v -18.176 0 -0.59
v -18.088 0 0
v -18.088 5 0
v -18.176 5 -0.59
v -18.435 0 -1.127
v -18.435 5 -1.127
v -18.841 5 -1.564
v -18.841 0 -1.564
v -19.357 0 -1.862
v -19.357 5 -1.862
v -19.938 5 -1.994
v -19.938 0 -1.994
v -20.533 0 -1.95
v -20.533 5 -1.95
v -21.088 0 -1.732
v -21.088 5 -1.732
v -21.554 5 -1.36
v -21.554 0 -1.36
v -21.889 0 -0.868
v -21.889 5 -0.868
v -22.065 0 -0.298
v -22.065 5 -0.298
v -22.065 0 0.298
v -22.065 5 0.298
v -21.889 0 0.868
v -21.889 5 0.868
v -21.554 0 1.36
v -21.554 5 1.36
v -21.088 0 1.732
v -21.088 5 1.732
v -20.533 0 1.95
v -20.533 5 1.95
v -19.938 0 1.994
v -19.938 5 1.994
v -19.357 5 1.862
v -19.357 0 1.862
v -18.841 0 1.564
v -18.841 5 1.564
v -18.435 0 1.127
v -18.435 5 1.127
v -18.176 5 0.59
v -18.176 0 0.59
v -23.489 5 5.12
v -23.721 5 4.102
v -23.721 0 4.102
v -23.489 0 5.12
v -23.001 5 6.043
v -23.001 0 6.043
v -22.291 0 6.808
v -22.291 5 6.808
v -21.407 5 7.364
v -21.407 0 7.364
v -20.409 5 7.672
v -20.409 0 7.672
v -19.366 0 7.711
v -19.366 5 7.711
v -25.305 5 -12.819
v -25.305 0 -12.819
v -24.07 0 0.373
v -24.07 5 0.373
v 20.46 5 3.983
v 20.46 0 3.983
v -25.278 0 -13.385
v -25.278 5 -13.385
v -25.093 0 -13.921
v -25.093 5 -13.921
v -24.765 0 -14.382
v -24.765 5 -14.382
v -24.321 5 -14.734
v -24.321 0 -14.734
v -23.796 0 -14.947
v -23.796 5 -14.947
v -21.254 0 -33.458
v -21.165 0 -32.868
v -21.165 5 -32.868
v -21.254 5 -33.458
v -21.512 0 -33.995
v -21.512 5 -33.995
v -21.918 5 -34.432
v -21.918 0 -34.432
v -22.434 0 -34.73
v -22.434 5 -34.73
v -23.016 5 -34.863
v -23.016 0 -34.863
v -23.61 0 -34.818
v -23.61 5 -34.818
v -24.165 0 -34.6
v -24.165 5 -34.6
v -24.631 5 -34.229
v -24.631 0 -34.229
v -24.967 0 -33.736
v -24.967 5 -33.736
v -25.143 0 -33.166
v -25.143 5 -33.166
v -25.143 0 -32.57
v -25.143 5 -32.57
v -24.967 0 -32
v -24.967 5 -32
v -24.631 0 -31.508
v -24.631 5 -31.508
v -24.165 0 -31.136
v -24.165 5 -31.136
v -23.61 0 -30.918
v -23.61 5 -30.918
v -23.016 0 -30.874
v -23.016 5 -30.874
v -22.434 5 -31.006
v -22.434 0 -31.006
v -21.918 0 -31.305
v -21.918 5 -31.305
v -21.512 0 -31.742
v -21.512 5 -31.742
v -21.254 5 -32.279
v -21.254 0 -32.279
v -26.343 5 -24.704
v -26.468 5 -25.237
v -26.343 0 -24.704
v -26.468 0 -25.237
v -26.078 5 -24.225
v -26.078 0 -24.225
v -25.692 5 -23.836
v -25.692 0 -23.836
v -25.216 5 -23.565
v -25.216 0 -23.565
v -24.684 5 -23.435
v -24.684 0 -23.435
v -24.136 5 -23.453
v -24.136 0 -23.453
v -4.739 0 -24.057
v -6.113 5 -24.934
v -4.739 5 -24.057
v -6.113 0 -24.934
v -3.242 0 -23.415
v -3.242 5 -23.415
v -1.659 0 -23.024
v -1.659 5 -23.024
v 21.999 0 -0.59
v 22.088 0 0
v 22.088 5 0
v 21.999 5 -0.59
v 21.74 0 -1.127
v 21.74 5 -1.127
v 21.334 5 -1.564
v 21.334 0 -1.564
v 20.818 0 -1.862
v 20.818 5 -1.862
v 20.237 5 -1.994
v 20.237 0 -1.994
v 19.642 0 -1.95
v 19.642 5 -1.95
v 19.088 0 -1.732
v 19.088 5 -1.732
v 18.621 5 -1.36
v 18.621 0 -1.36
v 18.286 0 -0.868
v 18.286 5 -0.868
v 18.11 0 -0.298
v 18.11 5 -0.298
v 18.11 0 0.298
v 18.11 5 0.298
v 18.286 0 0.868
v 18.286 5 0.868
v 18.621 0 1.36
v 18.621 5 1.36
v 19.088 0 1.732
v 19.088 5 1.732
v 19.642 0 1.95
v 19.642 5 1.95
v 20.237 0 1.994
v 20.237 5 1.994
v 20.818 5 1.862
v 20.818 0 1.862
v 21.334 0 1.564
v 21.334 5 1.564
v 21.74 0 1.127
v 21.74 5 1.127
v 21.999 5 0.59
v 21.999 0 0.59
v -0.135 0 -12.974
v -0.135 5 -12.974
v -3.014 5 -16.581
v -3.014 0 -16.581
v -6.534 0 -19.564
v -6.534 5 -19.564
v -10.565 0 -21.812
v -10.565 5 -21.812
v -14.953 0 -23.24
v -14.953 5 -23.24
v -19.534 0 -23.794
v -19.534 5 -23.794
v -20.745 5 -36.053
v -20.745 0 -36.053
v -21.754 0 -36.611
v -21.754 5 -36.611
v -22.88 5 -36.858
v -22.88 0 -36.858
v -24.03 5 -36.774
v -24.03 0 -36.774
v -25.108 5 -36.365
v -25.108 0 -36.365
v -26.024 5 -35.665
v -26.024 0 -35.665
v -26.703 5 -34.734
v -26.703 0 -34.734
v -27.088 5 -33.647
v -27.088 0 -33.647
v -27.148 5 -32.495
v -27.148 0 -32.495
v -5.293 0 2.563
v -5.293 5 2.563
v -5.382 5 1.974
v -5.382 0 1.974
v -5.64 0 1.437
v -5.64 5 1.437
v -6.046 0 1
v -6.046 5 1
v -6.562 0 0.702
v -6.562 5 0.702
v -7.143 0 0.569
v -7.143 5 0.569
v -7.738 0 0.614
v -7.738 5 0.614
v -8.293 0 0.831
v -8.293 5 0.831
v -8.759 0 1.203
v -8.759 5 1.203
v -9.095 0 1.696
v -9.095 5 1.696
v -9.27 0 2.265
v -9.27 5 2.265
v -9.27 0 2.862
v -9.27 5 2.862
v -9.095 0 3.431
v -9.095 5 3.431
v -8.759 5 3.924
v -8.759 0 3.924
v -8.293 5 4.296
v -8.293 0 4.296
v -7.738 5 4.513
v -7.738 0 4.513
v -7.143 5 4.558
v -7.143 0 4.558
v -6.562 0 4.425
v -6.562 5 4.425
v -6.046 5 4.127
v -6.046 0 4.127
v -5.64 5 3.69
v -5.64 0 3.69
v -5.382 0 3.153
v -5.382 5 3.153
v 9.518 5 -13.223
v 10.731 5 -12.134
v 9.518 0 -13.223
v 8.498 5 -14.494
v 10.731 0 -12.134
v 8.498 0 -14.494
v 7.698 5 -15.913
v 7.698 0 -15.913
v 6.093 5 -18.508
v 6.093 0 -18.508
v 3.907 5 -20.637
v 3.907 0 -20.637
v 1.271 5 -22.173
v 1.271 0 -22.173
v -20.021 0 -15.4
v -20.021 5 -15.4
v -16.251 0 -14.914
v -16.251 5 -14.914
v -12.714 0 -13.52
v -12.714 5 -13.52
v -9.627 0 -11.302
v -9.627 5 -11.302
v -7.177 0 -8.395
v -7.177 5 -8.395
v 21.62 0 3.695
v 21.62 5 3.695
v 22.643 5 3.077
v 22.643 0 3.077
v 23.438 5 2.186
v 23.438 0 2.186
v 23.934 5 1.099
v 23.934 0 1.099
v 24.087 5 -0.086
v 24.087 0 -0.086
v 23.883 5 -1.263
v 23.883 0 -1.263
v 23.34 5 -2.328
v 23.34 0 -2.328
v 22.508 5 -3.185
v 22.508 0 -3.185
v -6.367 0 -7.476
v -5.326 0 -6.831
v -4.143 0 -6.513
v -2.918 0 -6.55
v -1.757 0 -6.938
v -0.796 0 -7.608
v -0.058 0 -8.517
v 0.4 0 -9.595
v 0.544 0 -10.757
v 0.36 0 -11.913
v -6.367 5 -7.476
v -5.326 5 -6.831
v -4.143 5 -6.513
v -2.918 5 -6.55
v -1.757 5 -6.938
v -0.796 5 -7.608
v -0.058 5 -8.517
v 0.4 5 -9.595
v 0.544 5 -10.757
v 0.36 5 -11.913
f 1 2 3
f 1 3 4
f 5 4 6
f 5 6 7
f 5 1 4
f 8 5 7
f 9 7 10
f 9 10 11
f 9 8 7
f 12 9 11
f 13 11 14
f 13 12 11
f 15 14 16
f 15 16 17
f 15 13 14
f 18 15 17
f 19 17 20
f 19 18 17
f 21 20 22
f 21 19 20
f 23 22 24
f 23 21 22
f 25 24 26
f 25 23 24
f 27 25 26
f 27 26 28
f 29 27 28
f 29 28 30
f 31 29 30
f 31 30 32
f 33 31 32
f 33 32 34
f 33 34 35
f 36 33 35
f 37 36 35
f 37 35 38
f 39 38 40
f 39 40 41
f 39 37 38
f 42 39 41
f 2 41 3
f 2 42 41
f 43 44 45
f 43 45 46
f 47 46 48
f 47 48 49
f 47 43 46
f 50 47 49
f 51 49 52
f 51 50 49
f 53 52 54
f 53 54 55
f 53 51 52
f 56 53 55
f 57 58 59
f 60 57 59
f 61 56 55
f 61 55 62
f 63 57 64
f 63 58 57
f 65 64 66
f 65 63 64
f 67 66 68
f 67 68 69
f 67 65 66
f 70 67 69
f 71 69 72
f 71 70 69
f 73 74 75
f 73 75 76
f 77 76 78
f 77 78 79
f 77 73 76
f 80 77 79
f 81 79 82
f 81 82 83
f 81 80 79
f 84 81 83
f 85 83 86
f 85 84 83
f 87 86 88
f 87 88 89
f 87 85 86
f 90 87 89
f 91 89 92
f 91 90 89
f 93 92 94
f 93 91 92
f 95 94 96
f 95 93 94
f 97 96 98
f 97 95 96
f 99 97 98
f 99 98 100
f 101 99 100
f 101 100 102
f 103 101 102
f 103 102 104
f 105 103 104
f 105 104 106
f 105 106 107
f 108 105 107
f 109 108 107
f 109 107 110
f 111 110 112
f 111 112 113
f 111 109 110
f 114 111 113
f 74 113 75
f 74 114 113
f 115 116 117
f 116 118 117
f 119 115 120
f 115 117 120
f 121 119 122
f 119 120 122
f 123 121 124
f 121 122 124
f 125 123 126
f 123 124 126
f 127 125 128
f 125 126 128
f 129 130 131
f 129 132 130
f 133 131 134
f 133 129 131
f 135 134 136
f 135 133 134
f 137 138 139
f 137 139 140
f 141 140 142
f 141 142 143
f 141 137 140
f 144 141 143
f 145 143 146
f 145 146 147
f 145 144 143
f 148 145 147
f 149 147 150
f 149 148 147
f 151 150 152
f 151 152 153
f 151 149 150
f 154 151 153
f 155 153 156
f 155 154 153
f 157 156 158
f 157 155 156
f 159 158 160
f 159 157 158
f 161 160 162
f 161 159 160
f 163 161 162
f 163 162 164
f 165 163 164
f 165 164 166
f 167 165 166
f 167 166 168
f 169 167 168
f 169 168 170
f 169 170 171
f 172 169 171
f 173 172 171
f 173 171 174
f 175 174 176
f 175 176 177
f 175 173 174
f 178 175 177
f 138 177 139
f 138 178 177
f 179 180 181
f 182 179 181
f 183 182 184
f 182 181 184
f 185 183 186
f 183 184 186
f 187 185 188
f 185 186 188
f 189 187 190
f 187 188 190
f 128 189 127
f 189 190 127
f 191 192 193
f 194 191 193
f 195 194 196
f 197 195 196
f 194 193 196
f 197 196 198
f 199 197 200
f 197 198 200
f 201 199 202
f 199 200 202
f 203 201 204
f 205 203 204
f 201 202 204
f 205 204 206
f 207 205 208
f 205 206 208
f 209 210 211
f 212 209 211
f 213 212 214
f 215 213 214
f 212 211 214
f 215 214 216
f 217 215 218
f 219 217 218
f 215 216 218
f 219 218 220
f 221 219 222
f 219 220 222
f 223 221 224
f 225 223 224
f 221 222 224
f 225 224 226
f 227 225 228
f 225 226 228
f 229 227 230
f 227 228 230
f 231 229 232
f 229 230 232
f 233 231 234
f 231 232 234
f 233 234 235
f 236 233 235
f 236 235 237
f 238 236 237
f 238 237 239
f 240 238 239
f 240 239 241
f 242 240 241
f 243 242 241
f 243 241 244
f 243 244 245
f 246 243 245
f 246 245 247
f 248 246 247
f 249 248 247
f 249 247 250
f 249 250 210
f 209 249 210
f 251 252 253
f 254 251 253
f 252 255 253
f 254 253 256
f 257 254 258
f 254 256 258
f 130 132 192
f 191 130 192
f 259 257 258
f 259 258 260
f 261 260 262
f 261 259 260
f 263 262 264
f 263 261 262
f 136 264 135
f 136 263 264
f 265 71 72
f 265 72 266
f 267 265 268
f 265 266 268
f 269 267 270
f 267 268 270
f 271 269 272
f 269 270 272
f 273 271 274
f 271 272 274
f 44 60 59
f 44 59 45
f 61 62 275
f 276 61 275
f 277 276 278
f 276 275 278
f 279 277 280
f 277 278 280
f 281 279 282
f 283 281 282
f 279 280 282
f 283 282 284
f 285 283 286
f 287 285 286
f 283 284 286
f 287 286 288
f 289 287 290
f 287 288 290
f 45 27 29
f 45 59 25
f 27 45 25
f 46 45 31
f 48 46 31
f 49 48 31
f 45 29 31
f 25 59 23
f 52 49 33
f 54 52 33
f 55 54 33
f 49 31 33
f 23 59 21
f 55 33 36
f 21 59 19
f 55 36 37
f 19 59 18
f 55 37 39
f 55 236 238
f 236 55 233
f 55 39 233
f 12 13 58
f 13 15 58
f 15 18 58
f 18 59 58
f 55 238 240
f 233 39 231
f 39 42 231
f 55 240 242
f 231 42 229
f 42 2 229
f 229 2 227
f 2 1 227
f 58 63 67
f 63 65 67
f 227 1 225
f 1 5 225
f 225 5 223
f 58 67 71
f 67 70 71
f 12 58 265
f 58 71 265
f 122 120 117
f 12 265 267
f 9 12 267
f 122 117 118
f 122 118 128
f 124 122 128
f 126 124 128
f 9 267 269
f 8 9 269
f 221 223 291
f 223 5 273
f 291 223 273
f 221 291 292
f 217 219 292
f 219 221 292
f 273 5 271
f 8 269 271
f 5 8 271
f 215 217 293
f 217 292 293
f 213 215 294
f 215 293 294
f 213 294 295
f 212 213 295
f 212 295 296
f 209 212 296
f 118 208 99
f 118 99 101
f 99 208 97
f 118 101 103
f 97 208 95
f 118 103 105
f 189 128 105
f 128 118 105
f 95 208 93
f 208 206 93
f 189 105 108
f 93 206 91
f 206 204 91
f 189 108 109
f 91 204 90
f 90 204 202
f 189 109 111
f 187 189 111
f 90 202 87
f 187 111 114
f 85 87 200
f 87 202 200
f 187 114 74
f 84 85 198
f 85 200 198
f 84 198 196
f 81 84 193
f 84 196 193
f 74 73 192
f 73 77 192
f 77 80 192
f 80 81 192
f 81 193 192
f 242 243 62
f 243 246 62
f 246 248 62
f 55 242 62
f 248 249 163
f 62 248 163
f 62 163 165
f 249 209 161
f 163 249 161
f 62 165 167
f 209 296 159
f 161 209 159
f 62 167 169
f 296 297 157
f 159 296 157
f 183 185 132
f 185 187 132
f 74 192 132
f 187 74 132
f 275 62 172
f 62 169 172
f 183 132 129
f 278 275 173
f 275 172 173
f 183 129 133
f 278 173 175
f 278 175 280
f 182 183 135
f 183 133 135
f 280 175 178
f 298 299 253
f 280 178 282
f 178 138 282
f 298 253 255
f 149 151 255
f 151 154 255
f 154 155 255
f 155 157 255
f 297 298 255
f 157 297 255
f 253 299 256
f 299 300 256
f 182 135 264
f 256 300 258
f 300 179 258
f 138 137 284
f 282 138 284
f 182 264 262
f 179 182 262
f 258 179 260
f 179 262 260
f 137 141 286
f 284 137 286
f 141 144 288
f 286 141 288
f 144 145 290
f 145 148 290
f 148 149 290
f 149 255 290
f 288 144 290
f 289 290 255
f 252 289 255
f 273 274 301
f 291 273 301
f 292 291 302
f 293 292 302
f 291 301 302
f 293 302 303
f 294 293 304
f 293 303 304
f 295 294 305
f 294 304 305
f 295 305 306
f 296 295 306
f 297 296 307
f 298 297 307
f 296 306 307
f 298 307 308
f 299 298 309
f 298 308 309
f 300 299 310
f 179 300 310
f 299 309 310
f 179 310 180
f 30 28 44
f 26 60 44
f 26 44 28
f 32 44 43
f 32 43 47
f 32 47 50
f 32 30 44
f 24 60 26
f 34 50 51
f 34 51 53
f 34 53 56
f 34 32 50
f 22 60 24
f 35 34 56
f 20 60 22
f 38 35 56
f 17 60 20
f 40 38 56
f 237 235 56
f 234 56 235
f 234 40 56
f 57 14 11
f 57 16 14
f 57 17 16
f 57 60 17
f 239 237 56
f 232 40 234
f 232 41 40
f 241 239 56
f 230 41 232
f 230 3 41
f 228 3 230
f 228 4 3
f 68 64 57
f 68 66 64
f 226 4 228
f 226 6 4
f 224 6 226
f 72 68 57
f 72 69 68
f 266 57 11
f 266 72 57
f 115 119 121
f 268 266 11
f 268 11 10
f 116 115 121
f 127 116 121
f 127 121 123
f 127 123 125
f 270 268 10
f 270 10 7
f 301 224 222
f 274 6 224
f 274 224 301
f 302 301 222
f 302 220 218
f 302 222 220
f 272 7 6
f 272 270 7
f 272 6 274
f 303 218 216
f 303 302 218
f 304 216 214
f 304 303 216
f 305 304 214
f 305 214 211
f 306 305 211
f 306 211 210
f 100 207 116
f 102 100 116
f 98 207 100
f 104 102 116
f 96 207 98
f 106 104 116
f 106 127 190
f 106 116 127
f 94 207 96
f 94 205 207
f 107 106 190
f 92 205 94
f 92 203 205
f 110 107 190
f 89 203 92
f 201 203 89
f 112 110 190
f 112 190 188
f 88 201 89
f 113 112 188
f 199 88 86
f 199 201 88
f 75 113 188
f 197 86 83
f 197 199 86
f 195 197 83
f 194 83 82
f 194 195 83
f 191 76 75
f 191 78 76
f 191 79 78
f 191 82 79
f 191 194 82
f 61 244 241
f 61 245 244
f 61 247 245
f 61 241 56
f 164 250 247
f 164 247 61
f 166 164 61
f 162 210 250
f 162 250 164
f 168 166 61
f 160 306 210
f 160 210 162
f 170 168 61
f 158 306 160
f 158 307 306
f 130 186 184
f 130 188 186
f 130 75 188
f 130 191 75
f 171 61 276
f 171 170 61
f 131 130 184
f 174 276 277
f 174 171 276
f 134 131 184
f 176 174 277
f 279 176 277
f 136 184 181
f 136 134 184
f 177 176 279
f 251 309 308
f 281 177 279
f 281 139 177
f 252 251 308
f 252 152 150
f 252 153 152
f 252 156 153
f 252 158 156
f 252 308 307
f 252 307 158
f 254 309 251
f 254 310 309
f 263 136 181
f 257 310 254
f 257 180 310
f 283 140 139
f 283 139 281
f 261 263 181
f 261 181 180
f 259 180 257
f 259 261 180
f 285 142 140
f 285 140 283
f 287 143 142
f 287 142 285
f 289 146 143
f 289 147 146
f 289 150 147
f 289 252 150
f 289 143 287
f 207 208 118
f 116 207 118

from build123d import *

# Parameters (mm, degrees)
SKETCH_1_R          = 2
EXTRUDE_1_DEPTH     = 5
EXTRUDE_2_DEPTH     = 5
CUT_EXTRUDE_1_DEPTH = 6
EXTRUDE_3_DEPTH     = 5
FILLET_1_R          = 10
FILLET_2_R          = 2
SKETCH_6_R          = 2
CUT_EXTRUDE_2_DEPTH = 6


with BuildPart() as part:
    # 草图1 → 凸台-拉伸1 (new body)
    with BuildSketch(Plane(origin=(0, 0, 0), x_dir=(1, 0, 0), z_dir=(0, 1, 0))):
        with BuildLine():
            ThreePointArc((-20.0875, 4), (-23.044826598, 2.693365811), (-24.070081176, -0.372890305))
            ThreePointArc((-24.070081176, -0.372890305), (-22.780865811, -2.957326598), (-20.0875, -4))
            ThreePointArc((-20.0875, -4), (-17.130173402, -2.693365811), (-16.104918824, 0.372890305))
            Line((-16.104918824, 0.372890305), (-16.444526225, 4))
            Line((-16.444526225, 4), (-20.0875, 4))
        make_face()
        with Locations((-20.0875, 0)):
            Circle(SKETCH_1_R, mode=Mode.SUBTRACT)
        with BuildLine():
            Line((-27.14754486, 32.495352138), (-24.070081176, -0.372890305))
            ThreePointArc((-24.070081176, -0.372890305), (-23.044826598, 2.693365811), (-20.0875, 4))
            Line((-20.0875, 4), (-16.444526225, 4))
            Line((-16.444526225, 4), (-18.333300994, 24.172685504))
            Line((-18.333300994, 24.172685504), (-25.585127327, 29.683464909))
            ThreePointArc((-25.585127327, 29.683464909), (-26.661456606, 30.925425609), (-27.14754486, 32.495352138))
        make_face()
        with BuildLine():
            ThreePointArc((-20.74480004, 36.053019976), (-25.107780517, 36.364735365), (-27.14754486, 32.495352138))
            ThreePointArc((-27.14754486, 32.495352138), (-26.661456606, 30.925425609), (-25.585127327, 29.683464909))
            Line((-25.585127327, 29.683464909), (-18.333300994, 24.172685504))
            Line((-18.333300994, 24.172685504), (-19.182382508, 33.241132747))
            ThreePointArc((-19.182382508, 33.241132747), (-19.668470762, 34.811059276), (-20.74480004, 36.053019976))
        make_face()
        with Locations((-23.164963684, 32.868242443)):
            Circle(SKETCH_1_R, mode=Mode.SUBTRACT)
        with BuildLine():
            Line((22.507663644, 3.184777534), (-20.74480004, 36.053019976))
            ThreePointArc((-20.74480004, 36.053019976), (-19.668470762, 34.811059276), (-19.182382508, 33.241132747))
            Line((-19.182382508, 33.241132747), (-18.333300994, 24.172685504))
            Line((-18.333300994, 24.172685504), (8.212637649, 4))
            Line((8.212637649, 4), (20.0875, 4))
            ThreePointArc((20.0875, 4), (21.364388771, 3.790719598), (22.507663644, 3.184777534))
        make_face()
        with BuildLine():
            ThreePointArc((-16.104918824, 0.372890305), (-17.130173402, -2.693365811), (-20.0875, -4))
            Line((-20.0875, -4), (20.0875, -4))
            ThreePointArc((20.0875, -4), (18.810611229, -3.790719598), (17.667336356, -3.184777534))
            Line((17.667336356, -3.184777534), (8.212637649, 4))
            Line((8.212637649, 4), (-16.444526225, 4))
            Line((-16.444526225, 4), (-16.104918824, 0.372890305))
        make_face()
        with BuildLine():
            ThreePointArc((17.667336356, -3.184777534), (18.810611229, -3.790719598), (20.0875, -4))
            ThreePointArc((20.0875, -4), (23.878219598, -1.276888771), (22.507663644, 3.184777534))
            ThreePointArc((22.507663644, 3.184777534), (21.364388771, 3.790719598), (20.0875, 4))
            Line((20.0875, 4), (8.212637649, 4))
            Line((8.212637649, 4), (17.667336356, -3.184777534))
        make_face()
        with Locations((20.0875, 0)):
            Circle(SKETCH_1_R, mode=Mode.SUBTRACT)
        Polygon((-18.333300994, 24.172685504), (-16.444526225, 4), (8.212637649, 4), align=None)
    extrude(amount=EXTRUDE_1_DEPTH)

    # 草图2 → 凸台-拉伸2 (add)
    with BuildSketch(Plane(origin=(0, 5, 0), x_dir=(1, 0, 0), z_dir=(0, 1, 0))):
        with BuildLine():
            ThreePointArc((-20.0875, -4), (-22.780865811, -2.957326598), (-24.070081176, -0.372890305))
            Line((-24.070081176, -0.372890305), (-23.720962628, -4.10158193))
            ThreePointArc((-23.720962628, -4.10158193), (-22.290826699, -6.808468121), (-19.365512753, -7.711274824))
            Line((-19.365512753, -7.711274824), (20.460368699, -3.982583199))
            ThreePointArc((20.460368699, -3.982583199), (20.274137625, -3.995643427), (20.0875, -4))
            Line((20.0875, -4), (-20.0875, -4))
        make_face()
    extrude(amount=-EXTRUDE_2_DEPTH)

    # 草图3 → 切除-拉伸1 (cut, through all)
    with BuildSketch(Plane(origin=(0, 5, 0), x_dir=(1, 0, 0), z_dir=(0, 1, 0))):
        with BuildLine():
            ThreePointArc((-36.289327432, 17.433897667), (-37.629570165, 14.285674695), (-36.182704661, 11.185007239))
            ThreePointArc((-36.182704661, 11.185007239), (-31.653466249, 15.823666602), (-25.858788976, 18.731049718))
            Line((-25.858788976, 18.731049718), (-26.257218708, 22.986399698))
            ThreePointArc((-26.257218708, 22.986399698), (-31.612650276, 20.82332613), (-36.289327432, 17.433897667))
        make_face()
        with BuildLine():
            ThreePointArc((-25.858788976, 18.731049718), (-11.47348363, 17.605644606), (-1.756724615, 6.938492183))
            ThreePointArc((-1.756724615, 6.938492183), (0.40025314, 9.594618202), (-0.134776474, 12.974159854))
            ThreePointArc((-0.134776474, 12.974159854), (-11.569633945, 22.223545124), (-26.257218708, 22.986399698))
            Line((-26.257218708, 22.986399698), (-25.858788976, 18.731049718))
        make_face()
        with BuildLine():
            ThreePointArc((-7.176914189, 8.395044611), (-4.745829362, 6.62850376), (-1.756724615, 6.938492183))
            ThreePointArc((-1.756724615, 6.938492183), (-11.47348363, 17.605644606), (-25.858788976, 18.731049718))
            Line((-25.858788976, 18.731049718), (-25.456435977, 14.433798061))
            ThreePointArc((-25.456435977, 14.433798061), (-15.256790284, 14.622730376), (-7.176914189, 8.395044611))
        make_face()
        with BuildLine():
            ThreePointArc((-25.858788976, 18.731049718), (-31.653466249, 15.823666602), (-36.182704661, 11.185007239))
            ThreePointArc((-36.182704661, 11.185007239), (-33.358528619, 10.15793874), (-30.571035397, 11.280757314))
            ThreePointArc((-30.571035397, 11.280757314), (-28.168999159, 13.109133127), (-25.456435977, 14.433798061))
            Line((-25.456435977, 14.433798061), (-25.858788976, 18.731049718))
        make_face()
    extrude(amount=-CUT_EXTRUDE_1_DEPTH, mode=Mode.SUBTRACT)

    # 草图4 → 凸台-拉伸3 (add)
    with BuildSketch(Plane(origin=(0, 5, 0), x_dir=(1, 0, 0), z_dir=(0, 1, 0))):
        with BuildLine():
            Line((-3.809557715, 23.183657097), (8.427670456, 13.884390694))
            ThreePointArc((8.427670456, 13.884390694), (3.907166054, 20.637032025), (-3.809557715, 23.183657097))
        make_face()
    extrude(amount=-EXTRUDE_3_DEPTH)

    # 圆角1
    fillet_1_edges = [part.edges().sort_by_distance(p)[0] for p in [
        (8.427670456, 2.5, -13.884390694),
        (-3.809557715, 2.5, -23.183657097),
    ]]
    fillet(fillet_1_edges, radius=FILLET_1_R)

    # 圆角2
    fillet_2_edges = [part.edges().sort_by_distance(p)[0] for p in [
        (-26.257218708, 2.5, -22.986399698),
        (-25.456435977, 2.5, -14.433798061),
    ]]
    fillet(fillet_2_edges, radius=FILLET_2_R)

    # 草图6 → 切除-拉伸2 (cut, through all)
    with BuildSketch(Plane(origin=(0, 5, 0), x_dir=(1, 0, 0), z_dir=(0, 1, 0))):
        with Locations((-7.292808957, -2.56347694)):
            Circle(SKETCH_6_R)
    extrude(amount=-CUT_EXTRUDE_2_DEPTH, mode=Mode.SUBTRACT)


solid = part.part
